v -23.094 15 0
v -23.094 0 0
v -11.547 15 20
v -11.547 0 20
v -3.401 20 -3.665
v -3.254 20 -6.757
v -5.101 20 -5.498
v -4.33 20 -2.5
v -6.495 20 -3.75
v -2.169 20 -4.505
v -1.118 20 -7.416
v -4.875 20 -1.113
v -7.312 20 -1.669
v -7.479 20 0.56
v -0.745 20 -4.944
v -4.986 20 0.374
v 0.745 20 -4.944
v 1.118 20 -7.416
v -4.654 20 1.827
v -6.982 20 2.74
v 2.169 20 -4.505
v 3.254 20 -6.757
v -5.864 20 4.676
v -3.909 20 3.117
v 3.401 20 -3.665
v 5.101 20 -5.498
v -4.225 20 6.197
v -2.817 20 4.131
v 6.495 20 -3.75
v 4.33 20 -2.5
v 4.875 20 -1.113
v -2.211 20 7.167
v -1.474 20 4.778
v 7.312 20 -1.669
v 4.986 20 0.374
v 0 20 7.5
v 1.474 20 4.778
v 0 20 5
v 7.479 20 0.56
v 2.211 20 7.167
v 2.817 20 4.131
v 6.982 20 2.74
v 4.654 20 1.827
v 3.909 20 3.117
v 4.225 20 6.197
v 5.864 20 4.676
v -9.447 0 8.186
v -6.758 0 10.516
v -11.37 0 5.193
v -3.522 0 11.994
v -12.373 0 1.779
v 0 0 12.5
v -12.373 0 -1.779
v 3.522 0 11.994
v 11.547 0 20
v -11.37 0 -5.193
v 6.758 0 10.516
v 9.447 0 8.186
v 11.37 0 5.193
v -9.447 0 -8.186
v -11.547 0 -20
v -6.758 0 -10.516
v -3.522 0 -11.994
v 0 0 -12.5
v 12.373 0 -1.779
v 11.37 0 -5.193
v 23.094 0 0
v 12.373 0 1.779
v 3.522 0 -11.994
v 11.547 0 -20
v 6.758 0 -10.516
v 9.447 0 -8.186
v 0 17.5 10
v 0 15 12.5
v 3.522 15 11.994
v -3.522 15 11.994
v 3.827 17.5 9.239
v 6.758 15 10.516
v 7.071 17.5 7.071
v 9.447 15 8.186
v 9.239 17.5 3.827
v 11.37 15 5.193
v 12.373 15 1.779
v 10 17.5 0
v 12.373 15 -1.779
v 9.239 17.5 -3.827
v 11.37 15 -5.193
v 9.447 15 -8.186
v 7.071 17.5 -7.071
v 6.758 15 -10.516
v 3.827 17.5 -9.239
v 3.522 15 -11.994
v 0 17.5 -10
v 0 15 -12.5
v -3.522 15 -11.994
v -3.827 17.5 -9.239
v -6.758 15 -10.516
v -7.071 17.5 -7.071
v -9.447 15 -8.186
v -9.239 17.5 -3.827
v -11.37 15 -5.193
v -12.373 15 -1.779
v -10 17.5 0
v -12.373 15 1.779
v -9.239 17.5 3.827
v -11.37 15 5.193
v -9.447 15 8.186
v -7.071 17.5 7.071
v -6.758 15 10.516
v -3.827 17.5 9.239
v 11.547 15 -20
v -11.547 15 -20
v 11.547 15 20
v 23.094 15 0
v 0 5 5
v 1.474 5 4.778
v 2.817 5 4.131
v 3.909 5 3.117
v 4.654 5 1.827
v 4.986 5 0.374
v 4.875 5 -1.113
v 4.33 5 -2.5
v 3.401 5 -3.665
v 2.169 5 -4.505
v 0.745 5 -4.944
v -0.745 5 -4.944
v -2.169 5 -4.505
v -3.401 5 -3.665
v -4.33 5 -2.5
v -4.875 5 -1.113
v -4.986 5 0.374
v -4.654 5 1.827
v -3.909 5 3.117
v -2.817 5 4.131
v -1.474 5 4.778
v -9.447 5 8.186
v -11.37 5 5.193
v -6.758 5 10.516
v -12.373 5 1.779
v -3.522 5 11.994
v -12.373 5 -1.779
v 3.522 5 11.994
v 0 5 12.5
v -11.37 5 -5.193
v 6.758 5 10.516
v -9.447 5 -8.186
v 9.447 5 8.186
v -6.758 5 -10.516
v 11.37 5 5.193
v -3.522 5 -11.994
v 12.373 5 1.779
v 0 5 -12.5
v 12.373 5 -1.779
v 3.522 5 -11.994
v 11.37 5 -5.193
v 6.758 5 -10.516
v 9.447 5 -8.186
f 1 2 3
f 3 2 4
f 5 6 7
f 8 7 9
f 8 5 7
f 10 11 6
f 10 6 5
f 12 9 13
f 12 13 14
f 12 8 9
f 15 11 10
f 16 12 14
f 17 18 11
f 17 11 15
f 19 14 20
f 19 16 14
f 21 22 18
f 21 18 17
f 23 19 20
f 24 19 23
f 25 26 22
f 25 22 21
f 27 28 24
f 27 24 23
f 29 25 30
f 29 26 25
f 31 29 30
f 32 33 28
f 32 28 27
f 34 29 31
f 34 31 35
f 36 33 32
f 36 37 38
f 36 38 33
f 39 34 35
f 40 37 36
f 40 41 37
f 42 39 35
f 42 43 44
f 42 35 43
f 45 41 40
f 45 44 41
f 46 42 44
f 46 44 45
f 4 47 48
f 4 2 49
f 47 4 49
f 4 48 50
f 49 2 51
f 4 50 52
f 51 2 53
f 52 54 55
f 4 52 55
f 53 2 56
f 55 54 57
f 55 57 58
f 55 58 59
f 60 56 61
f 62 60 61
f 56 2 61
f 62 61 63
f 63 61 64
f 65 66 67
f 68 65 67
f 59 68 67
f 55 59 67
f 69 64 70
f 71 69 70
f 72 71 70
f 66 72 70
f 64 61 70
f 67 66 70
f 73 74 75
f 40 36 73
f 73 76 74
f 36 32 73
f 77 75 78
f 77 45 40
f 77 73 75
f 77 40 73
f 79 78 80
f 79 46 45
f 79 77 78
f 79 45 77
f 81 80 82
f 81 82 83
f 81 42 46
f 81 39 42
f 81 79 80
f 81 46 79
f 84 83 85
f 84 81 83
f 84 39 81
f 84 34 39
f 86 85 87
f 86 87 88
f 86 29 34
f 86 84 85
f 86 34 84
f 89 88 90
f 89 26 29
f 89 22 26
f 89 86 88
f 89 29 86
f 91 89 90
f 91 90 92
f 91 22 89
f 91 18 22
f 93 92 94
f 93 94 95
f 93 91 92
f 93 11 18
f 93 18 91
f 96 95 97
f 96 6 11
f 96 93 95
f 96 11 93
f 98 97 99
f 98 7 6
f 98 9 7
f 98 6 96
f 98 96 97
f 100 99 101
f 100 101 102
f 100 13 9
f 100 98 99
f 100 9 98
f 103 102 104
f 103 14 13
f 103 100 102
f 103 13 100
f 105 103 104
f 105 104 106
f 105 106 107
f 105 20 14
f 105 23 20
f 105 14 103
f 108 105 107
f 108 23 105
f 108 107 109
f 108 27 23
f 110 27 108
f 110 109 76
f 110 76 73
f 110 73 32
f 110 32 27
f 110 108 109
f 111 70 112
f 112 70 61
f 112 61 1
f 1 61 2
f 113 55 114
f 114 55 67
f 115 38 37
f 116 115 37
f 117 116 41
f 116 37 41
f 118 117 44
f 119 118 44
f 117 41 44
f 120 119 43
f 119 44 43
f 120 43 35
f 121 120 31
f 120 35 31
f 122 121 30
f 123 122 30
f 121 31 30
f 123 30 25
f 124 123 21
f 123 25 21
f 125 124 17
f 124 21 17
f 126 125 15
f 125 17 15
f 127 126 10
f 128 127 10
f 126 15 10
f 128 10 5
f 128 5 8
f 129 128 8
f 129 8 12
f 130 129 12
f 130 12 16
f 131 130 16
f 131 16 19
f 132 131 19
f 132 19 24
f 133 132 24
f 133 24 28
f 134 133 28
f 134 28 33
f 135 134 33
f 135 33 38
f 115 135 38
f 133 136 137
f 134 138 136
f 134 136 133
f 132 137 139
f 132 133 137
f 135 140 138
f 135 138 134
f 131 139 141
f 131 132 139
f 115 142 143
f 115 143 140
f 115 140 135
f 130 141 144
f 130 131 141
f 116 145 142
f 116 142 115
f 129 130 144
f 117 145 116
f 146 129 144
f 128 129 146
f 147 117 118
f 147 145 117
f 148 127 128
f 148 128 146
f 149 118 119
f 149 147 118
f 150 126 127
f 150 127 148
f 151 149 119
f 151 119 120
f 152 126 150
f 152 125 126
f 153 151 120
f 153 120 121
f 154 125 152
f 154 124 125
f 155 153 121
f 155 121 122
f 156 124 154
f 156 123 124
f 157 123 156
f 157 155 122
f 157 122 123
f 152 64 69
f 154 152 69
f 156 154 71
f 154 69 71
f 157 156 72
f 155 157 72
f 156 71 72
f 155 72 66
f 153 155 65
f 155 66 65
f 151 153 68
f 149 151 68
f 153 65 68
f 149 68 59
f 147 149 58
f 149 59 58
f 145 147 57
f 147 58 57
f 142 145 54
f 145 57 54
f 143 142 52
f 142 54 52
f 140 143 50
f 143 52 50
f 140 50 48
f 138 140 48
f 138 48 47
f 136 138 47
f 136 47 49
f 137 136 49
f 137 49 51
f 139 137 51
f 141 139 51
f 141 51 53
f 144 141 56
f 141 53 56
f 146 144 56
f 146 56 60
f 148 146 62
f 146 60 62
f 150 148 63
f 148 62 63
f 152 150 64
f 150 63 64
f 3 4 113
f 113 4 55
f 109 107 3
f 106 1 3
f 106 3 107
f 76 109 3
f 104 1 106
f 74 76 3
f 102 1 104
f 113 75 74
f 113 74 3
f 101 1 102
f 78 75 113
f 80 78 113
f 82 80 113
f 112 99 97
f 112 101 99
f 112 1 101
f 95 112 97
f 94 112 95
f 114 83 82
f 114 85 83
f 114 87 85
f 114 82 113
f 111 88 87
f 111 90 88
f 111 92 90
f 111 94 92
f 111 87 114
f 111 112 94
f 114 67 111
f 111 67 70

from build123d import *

# Parameters (mm, degrees)
BOSS_EXTRUDE1_DEPTH = 15
SKETCH2_R           = 12.5
BOSS_EXTRUDE2_DEPTH = 5
SKETCH3_R           = 5
CUT_EXTRUDE1_DEPTH  = 37.514837167
CHAMFER1_SIZE       = 5
SKETCH4_R           = 12.5
CUT_EXTRUDE2_DEPTH  = 5


with BuildPart() as part:
    # Sketch1 → Boss-Extrude1 (new body)
    with BuildSketch(Plane(origin=(0, 0, 0), x_dir=(1, 0, 0), z_dir=(0, 1, 0))):
        Polygon((11.547005384, 20), (-11.547005384, 20), (-23.094010768, 0), (-11.547005384, -20), (11.547005384, -20), (23.094010768, 0), align=None)
    extrude(amount=BOSS_EXTRUDE1_DEPTH)

    # Sketch2 → Boss-Extrude2 (add)
    with BuildSketch(Plane(origin=(0, 15, 0), x_dir=(1, 0, 0), z_dir=(0, 1, 0))):
        with Locations(Location((0, 0, 0), (0, 0, 270))):
            Circle(SKETCH2_R)
    extrude(amount=BOSS_EXTRUDE2_DEPTH)

    # Sketch3 → Cut-Extrude1 (cut, through all)
    with BuildSketch(Plane(origin=(0, 20, 0), x_dir=(1, 0, 0), z_dir=(0, 1, 0))):
        with Locations(Location((0, 0, 0), (0, 0, 270))):
            Circle(SKETCH3_R)
    extrude(amount=-CUT_EXTRUDE1_DEPTH, mode=Mode.SUBTRACT)

    # Chamfer1
    chamfer1_edges = [part.edges().sort_by_distance(p)[0] for p in [
        (0, 20, -12.5),
    ]]
    chamfer(chamfer1_edges, length=CHAMFER1_SIZE - 0.0001)  # a hair under: the kernel refuses the full size

    # Sketch4 → Cut-Extrude2 (cut)
    with BuildSketch(Plane.XZ):
        with Locations(Location((0, 0, 0), (0, 0, 270))):
            Circle(SKETCH4_R)
    extrude(amount=-CUT_EXTRUDE2_DEPTH, mode=Mode.SUBTRACT)


solid = part.part
